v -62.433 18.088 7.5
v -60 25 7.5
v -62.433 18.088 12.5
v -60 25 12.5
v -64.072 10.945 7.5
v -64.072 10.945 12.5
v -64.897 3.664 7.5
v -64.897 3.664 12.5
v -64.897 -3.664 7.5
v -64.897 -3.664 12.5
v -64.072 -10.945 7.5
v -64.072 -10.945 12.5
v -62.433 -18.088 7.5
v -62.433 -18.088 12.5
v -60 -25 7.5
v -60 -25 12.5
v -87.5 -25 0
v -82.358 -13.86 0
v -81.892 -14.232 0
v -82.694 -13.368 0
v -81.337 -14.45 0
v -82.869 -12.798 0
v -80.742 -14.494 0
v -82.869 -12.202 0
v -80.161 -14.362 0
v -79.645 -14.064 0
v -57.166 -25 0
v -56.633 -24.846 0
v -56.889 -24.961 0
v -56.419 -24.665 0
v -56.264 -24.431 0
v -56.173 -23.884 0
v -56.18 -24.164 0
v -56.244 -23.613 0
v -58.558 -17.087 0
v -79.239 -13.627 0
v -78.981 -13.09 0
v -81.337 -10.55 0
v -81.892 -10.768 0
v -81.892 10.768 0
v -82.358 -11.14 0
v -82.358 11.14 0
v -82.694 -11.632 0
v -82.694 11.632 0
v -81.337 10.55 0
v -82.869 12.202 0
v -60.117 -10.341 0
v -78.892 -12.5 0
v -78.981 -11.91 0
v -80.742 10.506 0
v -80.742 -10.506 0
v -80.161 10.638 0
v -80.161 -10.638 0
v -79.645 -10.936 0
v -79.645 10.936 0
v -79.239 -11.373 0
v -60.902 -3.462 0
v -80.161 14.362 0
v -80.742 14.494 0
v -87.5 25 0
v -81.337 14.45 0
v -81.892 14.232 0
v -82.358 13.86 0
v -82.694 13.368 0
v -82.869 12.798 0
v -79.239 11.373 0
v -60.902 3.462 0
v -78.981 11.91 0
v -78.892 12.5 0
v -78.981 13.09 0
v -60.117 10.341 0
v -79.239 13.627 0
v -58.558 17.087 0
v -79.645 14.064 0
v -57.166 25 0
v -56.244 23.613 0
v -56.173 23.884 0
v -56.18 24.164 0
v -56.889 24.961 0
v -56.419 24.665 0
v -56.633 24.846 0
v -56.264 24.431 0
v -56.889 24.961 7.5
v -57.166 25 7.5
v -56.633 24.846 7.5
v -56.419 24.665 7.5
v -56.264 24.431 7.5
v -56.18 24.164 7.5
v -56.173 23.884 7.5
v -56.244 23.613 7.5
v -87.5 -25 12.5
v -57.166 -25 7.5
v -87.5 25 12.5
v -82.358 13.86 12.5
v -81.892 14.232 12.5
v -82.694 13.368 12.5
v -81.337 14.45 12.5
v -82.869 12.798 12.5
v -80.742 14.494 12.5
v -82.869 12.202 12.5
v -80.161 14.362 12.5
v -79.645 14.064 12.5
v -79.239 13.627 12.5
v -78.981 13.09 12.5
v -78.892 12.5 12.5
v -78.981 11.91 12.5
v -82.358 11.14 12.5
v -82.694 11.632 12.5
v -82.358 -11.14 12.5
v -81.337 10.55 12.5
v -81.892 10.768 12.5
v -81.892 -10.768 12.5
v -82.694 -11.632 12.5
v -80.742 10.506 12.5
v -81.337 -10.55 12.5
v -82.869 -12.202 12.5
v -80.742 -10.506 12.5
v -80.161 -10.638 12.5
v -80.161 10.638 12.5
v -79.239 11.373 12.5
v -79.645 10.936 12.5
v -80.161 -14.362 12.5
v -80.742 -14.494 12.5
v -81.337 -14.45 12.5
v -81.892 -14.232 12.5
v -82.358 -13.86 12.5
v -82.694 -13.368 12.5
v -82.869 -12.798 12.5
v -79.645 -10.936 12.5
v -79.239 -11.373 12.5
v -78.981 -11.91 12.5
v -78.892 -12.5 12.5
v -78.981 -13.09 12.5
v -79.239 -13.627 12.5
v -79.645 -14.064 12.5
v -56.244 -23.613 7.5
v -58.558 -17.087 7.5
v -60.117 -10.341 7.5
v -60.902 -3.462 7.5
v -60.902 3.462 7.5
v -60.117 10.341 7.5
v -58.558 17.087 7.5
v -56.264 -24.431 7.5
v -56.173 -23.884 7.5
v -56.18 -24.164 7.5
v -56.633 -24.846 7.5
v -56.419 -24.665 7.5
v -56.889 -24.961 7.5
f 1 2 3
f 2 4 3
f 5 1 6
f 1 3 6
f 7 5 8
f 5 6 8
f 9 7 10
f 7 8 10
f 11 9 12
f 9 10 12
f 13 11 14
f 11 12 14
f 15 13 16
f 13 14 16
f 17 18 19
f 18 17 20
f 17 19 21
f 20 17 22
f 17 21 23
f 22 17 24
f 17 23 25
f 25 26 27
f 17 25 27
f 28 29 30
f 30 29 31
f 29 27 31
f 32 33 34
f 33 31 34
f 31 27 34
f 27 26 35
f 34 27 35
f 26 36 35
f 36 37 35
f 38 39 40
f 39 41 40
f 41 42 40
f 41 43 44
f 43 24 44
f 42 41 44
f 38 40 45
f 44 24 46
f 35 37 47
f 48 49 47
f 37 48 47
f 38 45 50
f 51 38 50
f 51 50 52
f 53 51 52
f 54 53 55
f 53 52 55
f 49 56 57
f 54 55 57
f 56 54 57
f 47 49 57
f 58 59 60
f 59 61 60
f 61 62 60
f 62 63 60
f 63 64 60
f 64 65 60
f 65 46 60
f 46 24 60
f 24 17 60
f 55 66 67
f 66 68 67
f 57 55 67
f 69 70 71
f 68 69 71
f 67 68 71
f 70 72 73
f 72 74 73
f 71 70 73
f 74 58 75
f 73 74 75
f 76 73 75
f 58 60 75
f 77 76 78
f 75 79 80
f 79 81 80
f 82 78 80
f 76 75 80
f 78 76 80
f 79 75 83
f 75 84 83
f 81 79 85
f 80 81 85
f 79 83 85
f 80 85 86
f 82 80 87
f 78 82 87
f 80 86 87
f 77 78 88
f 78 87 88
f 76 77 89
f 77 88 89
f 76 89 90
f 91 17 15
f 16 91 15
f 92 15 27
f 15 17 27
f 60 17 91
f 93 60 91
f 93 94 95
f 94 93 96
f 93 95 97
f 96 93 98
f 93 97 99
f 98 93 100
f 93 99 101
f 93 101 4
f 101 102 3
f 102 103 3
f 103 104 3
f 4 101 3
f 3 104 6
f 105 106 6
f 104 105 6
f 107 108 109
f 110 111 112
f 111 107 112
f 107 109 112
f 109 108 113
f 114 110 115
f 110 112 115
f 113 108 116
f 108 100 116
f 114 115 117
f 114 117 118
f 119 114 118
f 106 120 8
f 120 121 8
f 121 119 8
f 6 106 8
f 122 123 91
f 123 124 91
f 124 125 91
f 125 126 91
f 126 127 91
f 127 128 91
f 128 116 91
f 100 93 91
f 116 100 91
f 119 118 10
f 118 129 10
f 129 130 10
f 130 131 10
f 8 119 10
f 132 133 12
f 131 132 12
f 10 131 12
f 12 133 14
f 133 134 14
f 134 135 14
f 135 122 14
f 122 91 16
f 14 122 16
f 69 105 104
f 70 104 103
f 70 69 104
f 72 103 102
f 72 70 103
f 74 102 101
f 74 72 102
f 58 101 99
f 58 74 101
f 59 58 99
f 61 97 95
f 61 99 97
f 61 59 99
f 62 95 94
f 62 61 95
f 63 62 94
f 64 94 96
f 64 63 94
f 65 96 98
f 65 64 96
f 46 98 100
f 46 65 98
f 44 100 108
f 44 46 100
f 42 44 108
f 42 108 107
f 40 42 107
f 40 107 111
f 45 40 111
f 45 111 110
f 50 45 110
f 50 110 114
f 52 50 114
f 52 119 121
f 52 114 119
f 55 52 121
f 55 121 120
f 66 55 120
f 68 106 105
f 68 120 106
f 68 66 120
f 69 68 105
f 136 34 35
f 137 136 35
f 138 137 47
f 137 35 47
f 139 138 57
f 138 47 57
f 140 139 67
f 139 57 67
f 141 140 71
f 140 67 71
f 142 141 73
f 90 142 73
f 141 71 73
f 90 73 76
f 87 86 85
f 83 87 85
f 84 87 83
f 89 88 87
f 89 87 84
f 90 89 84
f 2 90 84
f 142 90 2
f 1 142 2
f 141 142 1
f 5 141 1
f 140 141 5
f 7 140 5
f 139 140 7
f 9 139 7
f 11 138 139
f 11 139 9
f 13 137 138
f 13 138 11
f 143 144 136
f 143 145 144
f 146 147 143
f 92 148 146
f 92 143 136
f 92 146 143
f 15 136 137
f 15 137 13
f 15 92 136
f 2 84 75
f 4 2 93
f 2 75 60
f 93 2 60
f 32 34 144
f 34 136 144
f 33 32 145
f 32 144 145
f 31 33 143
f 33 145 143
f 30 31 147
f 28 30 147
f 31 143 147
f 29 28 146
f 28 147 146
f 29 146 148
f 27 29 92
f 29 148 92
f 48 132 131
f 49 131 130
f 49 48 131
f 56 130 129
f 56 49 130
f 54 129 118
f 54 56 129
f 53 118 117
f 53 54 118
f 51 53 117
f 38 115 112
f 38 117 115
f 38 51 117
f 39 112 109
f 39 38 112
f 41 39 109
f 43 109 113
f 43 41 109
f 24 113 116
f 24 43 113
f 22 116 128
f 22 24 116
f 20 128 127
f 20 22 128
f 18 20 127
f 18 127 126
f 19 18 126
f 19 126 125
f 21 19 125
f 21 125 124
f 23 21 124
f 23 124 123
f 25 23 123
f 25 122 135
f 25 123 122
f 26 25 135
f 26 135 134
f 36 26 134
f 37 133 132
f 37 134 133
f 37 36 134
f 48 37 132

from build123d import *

# Parameters (mm, degrees)
F0_W     = 27.141710973
F0_H     = 25
F0_R     = 2
F2_DEPTH = 25
F1_W     = 8
F1_H     = 10
F4_R     = 1
F5_W     = 175
F5_H     = 25
F6_DEPTH = 25


# Not quite as in the source:
# - a feature names something its author has since deleted; it is built from what else it names


with BuildPart() as f2:
    # F0 (on Top) → F2 (new body)
    with BuildSketch(Plane.XY):
        with BuildLine():
            ThreePointArc((-61, 0), (-59.6453869522, 12.7838888967), (-55.641710973, 25))
            Line((-55.641710973, 25), (-61, 25))
            Line((-61, 25), (-61, 0))
        make_face()
        with BuildLine():
            Line((-59.5, 19.1311264697), (-59.5, 23.5))
            Line((-59.5, 23.5), (-57.9137289423, 23.5))
            ThreePointArc((-57.9137289423, 23.5), (-58.7474910104, 21.3303141089), (-59.5, 19.1311264697))
        make_face(mode=Mode.SUBTRACT)
        with BuildLine():
            ThreePointArc((-55.641710973, -25), (-59.6453869522, -12.7838888967), (-61, 0))
            Line((-61, 0), (-61, -25))
            Line((-61, -25), (-55.641710973, -25))
        make_face()
        with BuildLine():
            Line((-57.9137289423, -23.5), (-59.5, -23.5))
            Line((-59.5, -23.5), (-59.5, -19.1311264697))
            ThreePointArc((-59.5, -19.1311264697), (-58.7474910104, -21.3303141089), (-57.9137289423, -23.5))
        make_face(mode=Mode.SUBTRACT)
        with Locations((-74.5708554865, -12.5)):
            Rectangle(F0_W, F0_H)
        with Locations((-80.891710973, -12.5)):
            Circle(F0_R, mode=Mode.SUBTRACT)
        with Locations((-74.5708554865, 12.5)):
            Rectangle(F0_W, F0_H)
        with Locations((-80.891710973, 12.5)):
            Circle(F0_R, mode=Mode.SUBTRACT)
        with BuildLine():
            Line((-57.9137289423, 23.5), (-59.5, 23.5))
            Line((-59.5, 23.5), (-59.5, 19.1311264697))
            ThreePointArc((-59.5, 19.1311264697), (-58.7474910104, 21.3303141089), (-57.9137289423, 23.5))
        make_face()
        with BuildLine():
            Line((-59.5, -19.1311264697), (-59.5, -23.5))
            Line((-59.5, -23.5), (-57.9137289423, -23.5))
            ThreePointArc((-57.9137289423, -23.5), (-58.7474910104, -21.3303141089), (-59.5, -19.1311264697))
        make_face()
    extrude(amount=F2_DEPTH)

    # F1 (on Front) → F3 (revolve, cut)
    with BuildSketch(Plane.XZ):
        with Locations((-61, 12.5)):
            Rectangle(F1_W, F1_H)
    revolve(axis=Axis((0, 0, 15.2043728158), (0, 0, 1)), mode=Mode.SUBTRACT)

    # F4
    f4_edges = [f2.edges().sort_by_distance(p)[0] for p in [
        (-55.641711, 25, 21.25),
        (-55.641711, 25, 3.75),
        (-55.641711, -25, 3.75),
        (-55.641711, -25, 21.25),
    ]]
    fillet(f4_edges, radius=F4_R)

    # F5 (on Front) → F6 (intersect, symmetric)
    with BuildSketch(Plane.XZ):
        Rectangle(F5_W, F5_H)
    extrude(amount=F6_DEPTH, both=True, mode=Mode.INTERSECT)


solid = f2.part
